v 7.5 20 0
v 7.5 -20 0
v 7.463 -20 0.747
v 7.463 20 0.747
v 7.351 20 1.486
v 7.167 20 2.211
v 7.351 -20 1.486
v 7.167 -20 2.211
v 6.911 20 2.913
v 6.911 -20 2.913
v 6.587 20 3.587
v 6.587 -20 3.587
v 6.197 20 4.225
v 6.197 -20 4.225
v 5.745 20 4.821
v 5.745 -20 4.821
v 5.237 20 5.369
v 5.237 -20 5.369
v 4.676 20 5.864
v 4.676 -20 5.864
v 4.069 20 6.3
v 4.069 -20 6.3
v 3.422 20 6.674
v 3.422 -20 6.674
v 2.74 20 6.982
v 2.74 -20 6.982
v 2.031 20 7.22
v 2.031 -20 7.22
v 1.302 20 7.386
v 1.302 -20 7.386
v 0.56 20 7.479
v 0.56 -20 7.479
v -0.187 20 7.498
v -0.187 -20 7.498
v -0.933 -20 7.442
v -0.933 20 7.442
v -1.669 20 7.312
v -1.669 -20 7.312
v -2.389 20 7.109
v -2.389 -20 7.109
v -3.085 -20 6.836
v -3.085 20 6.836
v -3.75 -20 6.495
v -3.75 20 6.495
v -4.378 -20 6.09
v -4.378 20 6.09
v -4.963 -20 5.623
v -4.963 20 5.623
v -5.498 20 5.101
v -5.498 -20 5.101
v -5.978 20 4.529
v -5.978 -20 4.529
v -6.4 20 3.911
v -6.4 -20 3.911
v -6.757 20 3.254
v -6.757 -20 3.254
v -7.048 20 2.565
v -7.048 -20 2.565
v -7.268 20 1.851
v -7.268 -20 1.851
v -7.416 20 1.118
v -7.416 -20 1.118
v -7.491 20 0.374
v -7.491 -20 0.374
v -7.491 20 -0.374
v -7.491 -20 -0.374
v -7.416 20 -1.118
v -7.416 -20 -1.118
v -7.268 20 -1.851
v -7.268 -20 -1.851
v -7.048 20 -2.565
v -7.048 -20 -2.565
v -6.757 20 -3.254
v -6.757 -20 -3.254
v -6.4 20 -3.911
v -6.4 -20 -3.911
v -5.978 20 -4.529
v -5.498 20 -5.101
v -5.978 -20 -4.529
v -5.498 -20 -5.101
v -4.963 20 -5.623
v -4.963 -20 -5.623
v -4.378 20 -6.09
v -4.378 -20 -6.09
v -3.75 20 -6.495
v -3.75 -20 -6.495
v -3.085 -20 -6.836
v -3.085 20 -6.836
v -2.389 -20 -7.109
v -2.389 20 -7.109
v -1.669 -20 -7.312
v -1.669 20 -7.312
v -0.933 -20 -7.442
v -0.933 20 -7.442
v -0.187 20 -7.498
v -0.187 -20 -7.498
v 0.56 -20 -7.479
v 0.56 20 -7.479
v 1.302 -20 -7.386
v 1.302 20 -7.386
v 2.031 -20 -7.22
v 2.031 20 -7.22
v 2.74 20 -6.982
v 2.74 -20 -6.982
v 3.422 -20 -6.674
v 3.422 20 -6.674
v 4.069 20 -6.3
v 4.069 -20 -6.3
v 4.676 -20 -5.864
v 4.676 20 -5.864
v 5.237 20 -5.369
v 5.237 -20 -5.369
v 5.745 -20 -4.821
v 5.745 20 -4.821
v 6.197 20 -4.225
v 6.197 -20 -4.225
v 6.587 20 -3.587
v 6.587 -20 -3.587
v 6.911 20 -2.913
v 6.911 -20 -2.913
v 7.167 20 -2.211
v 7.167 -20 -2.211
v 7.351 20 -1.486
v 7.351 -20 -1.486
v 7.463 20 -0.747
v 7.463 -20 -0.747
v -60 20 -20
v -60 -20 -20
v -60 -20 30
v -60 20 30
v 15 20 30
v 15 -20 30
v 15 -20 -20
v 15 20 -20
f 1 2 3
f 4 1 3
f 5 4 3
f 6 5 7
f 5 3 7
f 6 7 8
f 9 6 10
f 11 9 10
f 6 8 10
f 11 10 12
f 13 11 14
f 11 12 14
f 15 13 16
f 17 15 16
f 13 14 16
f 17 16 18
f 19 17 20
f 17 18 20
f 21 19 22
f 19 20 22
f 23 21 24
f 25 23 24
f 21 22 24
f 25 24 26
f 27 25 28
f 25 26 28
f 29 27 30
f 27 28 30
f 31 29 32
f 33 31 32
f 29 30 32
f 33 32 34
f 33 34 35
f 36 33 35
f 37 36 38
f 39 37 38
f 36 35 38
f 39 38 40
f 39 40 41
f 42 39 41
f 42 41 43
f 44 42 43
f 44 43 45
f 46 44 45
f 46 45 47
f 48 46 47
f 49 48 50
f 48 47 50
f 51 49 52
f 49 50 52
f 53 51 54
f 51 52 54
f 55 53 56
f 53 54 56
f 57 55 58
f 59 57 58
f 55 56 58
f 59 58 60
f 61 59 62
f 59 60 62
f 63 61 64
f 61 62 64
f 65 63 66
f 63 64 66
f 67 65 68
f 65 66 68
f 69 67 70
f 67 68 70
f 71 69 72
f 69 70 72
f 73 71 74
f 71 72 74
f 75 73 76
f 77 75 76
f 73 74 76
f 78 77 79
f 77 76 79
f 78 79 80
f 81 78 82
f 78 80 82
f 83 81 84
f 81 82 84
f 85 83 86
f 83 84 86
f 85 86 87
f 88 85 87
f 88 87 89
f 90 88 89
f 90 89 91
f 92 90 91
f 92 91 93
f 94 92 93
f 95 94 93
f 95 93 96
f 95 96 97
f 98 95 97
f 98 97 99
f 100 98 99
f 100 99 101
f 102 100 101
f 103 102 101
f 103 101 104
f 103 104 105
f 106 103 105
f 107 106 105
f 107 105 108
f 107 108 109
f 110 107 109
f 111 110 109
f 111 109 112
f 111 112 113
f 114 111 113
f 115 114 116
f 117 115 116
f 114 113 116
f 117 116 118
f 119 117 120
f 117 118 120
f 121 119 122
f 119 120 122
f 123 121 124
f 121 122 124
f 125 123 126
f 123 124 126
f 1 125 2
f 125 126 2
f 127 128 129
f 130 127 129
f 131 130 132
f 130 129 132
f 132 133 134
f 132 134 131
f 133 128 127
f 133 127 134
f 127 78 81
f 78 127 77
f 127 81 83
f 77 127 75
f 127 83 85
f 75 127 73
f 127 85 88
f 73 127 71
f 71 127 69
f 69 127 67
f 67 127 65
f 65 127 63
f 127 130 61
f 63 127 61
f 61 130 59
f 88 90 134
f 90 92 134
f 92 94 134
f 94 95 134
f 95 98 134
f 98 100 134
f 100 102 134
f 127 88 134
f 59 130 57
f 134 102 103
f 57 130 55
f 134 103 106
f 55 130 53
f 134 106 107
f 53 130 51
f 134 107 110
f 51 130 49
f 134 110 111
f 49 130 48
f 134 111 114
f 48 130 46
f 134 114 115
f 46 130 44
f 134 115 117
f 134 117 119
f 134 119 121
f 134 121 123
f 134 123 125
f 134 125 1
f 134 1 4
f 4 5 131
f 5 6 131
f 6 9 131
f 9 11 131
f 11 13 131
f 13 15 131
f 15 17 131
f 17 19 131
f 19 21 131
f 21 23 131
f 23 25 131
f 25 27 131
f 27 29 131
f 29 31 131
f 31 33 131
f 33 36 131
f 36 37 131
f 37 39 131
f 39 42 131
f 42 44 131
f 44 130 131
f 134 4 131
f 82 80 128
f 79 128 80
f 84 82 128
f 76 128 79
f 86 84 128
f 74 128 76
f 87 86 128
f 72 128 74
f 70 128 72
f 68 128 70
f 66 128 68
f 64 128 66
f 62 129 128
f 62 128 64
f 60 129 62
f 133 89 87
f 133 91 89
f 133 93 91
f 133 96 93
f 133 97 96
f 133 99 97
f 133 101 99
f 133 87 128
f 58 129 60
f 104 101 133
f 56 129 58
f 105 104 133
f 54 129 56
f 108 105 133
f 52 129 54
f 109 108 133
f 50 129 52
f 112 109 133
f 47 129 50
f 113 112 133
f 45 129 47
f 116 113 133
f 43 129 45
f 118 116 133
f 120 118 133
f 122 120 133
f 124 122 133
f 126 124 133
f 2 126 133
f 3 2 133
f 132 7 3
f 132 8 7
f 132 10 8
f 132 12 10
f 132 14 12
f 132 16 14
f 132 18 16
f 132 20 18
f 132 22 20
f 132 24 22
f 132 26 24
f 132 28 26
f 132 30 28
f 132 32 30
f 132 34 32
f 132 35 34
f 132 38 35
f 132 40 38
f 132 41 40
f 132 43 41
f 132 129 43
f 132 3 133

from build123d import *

# Parameters (mm, degrees)
F0_W     = 75
F0_H     = 50
F1_DEPTH = 20
F2_R     = 7.5
F3_DEPTH = 40


with BuildPart() as f1:
    # F0 (on Front) → F1 (new body, symmetric)
    with BuildSketch(Plane.XZ):
        with Locations((-22.5, 5)):
            Rectangle(F0_W, F0_H)
    extrude(amount=F1_DEPTH, both=True)

    # F2 (on face) → F3 (cut, through all)
    with BuildSketch(Plane.XZ.offset(20)):
        Circle(F2_R)
    extrude(amount=-F3_DEPTH, mode=Mode.SUBTRACT)


solid = f1.part
